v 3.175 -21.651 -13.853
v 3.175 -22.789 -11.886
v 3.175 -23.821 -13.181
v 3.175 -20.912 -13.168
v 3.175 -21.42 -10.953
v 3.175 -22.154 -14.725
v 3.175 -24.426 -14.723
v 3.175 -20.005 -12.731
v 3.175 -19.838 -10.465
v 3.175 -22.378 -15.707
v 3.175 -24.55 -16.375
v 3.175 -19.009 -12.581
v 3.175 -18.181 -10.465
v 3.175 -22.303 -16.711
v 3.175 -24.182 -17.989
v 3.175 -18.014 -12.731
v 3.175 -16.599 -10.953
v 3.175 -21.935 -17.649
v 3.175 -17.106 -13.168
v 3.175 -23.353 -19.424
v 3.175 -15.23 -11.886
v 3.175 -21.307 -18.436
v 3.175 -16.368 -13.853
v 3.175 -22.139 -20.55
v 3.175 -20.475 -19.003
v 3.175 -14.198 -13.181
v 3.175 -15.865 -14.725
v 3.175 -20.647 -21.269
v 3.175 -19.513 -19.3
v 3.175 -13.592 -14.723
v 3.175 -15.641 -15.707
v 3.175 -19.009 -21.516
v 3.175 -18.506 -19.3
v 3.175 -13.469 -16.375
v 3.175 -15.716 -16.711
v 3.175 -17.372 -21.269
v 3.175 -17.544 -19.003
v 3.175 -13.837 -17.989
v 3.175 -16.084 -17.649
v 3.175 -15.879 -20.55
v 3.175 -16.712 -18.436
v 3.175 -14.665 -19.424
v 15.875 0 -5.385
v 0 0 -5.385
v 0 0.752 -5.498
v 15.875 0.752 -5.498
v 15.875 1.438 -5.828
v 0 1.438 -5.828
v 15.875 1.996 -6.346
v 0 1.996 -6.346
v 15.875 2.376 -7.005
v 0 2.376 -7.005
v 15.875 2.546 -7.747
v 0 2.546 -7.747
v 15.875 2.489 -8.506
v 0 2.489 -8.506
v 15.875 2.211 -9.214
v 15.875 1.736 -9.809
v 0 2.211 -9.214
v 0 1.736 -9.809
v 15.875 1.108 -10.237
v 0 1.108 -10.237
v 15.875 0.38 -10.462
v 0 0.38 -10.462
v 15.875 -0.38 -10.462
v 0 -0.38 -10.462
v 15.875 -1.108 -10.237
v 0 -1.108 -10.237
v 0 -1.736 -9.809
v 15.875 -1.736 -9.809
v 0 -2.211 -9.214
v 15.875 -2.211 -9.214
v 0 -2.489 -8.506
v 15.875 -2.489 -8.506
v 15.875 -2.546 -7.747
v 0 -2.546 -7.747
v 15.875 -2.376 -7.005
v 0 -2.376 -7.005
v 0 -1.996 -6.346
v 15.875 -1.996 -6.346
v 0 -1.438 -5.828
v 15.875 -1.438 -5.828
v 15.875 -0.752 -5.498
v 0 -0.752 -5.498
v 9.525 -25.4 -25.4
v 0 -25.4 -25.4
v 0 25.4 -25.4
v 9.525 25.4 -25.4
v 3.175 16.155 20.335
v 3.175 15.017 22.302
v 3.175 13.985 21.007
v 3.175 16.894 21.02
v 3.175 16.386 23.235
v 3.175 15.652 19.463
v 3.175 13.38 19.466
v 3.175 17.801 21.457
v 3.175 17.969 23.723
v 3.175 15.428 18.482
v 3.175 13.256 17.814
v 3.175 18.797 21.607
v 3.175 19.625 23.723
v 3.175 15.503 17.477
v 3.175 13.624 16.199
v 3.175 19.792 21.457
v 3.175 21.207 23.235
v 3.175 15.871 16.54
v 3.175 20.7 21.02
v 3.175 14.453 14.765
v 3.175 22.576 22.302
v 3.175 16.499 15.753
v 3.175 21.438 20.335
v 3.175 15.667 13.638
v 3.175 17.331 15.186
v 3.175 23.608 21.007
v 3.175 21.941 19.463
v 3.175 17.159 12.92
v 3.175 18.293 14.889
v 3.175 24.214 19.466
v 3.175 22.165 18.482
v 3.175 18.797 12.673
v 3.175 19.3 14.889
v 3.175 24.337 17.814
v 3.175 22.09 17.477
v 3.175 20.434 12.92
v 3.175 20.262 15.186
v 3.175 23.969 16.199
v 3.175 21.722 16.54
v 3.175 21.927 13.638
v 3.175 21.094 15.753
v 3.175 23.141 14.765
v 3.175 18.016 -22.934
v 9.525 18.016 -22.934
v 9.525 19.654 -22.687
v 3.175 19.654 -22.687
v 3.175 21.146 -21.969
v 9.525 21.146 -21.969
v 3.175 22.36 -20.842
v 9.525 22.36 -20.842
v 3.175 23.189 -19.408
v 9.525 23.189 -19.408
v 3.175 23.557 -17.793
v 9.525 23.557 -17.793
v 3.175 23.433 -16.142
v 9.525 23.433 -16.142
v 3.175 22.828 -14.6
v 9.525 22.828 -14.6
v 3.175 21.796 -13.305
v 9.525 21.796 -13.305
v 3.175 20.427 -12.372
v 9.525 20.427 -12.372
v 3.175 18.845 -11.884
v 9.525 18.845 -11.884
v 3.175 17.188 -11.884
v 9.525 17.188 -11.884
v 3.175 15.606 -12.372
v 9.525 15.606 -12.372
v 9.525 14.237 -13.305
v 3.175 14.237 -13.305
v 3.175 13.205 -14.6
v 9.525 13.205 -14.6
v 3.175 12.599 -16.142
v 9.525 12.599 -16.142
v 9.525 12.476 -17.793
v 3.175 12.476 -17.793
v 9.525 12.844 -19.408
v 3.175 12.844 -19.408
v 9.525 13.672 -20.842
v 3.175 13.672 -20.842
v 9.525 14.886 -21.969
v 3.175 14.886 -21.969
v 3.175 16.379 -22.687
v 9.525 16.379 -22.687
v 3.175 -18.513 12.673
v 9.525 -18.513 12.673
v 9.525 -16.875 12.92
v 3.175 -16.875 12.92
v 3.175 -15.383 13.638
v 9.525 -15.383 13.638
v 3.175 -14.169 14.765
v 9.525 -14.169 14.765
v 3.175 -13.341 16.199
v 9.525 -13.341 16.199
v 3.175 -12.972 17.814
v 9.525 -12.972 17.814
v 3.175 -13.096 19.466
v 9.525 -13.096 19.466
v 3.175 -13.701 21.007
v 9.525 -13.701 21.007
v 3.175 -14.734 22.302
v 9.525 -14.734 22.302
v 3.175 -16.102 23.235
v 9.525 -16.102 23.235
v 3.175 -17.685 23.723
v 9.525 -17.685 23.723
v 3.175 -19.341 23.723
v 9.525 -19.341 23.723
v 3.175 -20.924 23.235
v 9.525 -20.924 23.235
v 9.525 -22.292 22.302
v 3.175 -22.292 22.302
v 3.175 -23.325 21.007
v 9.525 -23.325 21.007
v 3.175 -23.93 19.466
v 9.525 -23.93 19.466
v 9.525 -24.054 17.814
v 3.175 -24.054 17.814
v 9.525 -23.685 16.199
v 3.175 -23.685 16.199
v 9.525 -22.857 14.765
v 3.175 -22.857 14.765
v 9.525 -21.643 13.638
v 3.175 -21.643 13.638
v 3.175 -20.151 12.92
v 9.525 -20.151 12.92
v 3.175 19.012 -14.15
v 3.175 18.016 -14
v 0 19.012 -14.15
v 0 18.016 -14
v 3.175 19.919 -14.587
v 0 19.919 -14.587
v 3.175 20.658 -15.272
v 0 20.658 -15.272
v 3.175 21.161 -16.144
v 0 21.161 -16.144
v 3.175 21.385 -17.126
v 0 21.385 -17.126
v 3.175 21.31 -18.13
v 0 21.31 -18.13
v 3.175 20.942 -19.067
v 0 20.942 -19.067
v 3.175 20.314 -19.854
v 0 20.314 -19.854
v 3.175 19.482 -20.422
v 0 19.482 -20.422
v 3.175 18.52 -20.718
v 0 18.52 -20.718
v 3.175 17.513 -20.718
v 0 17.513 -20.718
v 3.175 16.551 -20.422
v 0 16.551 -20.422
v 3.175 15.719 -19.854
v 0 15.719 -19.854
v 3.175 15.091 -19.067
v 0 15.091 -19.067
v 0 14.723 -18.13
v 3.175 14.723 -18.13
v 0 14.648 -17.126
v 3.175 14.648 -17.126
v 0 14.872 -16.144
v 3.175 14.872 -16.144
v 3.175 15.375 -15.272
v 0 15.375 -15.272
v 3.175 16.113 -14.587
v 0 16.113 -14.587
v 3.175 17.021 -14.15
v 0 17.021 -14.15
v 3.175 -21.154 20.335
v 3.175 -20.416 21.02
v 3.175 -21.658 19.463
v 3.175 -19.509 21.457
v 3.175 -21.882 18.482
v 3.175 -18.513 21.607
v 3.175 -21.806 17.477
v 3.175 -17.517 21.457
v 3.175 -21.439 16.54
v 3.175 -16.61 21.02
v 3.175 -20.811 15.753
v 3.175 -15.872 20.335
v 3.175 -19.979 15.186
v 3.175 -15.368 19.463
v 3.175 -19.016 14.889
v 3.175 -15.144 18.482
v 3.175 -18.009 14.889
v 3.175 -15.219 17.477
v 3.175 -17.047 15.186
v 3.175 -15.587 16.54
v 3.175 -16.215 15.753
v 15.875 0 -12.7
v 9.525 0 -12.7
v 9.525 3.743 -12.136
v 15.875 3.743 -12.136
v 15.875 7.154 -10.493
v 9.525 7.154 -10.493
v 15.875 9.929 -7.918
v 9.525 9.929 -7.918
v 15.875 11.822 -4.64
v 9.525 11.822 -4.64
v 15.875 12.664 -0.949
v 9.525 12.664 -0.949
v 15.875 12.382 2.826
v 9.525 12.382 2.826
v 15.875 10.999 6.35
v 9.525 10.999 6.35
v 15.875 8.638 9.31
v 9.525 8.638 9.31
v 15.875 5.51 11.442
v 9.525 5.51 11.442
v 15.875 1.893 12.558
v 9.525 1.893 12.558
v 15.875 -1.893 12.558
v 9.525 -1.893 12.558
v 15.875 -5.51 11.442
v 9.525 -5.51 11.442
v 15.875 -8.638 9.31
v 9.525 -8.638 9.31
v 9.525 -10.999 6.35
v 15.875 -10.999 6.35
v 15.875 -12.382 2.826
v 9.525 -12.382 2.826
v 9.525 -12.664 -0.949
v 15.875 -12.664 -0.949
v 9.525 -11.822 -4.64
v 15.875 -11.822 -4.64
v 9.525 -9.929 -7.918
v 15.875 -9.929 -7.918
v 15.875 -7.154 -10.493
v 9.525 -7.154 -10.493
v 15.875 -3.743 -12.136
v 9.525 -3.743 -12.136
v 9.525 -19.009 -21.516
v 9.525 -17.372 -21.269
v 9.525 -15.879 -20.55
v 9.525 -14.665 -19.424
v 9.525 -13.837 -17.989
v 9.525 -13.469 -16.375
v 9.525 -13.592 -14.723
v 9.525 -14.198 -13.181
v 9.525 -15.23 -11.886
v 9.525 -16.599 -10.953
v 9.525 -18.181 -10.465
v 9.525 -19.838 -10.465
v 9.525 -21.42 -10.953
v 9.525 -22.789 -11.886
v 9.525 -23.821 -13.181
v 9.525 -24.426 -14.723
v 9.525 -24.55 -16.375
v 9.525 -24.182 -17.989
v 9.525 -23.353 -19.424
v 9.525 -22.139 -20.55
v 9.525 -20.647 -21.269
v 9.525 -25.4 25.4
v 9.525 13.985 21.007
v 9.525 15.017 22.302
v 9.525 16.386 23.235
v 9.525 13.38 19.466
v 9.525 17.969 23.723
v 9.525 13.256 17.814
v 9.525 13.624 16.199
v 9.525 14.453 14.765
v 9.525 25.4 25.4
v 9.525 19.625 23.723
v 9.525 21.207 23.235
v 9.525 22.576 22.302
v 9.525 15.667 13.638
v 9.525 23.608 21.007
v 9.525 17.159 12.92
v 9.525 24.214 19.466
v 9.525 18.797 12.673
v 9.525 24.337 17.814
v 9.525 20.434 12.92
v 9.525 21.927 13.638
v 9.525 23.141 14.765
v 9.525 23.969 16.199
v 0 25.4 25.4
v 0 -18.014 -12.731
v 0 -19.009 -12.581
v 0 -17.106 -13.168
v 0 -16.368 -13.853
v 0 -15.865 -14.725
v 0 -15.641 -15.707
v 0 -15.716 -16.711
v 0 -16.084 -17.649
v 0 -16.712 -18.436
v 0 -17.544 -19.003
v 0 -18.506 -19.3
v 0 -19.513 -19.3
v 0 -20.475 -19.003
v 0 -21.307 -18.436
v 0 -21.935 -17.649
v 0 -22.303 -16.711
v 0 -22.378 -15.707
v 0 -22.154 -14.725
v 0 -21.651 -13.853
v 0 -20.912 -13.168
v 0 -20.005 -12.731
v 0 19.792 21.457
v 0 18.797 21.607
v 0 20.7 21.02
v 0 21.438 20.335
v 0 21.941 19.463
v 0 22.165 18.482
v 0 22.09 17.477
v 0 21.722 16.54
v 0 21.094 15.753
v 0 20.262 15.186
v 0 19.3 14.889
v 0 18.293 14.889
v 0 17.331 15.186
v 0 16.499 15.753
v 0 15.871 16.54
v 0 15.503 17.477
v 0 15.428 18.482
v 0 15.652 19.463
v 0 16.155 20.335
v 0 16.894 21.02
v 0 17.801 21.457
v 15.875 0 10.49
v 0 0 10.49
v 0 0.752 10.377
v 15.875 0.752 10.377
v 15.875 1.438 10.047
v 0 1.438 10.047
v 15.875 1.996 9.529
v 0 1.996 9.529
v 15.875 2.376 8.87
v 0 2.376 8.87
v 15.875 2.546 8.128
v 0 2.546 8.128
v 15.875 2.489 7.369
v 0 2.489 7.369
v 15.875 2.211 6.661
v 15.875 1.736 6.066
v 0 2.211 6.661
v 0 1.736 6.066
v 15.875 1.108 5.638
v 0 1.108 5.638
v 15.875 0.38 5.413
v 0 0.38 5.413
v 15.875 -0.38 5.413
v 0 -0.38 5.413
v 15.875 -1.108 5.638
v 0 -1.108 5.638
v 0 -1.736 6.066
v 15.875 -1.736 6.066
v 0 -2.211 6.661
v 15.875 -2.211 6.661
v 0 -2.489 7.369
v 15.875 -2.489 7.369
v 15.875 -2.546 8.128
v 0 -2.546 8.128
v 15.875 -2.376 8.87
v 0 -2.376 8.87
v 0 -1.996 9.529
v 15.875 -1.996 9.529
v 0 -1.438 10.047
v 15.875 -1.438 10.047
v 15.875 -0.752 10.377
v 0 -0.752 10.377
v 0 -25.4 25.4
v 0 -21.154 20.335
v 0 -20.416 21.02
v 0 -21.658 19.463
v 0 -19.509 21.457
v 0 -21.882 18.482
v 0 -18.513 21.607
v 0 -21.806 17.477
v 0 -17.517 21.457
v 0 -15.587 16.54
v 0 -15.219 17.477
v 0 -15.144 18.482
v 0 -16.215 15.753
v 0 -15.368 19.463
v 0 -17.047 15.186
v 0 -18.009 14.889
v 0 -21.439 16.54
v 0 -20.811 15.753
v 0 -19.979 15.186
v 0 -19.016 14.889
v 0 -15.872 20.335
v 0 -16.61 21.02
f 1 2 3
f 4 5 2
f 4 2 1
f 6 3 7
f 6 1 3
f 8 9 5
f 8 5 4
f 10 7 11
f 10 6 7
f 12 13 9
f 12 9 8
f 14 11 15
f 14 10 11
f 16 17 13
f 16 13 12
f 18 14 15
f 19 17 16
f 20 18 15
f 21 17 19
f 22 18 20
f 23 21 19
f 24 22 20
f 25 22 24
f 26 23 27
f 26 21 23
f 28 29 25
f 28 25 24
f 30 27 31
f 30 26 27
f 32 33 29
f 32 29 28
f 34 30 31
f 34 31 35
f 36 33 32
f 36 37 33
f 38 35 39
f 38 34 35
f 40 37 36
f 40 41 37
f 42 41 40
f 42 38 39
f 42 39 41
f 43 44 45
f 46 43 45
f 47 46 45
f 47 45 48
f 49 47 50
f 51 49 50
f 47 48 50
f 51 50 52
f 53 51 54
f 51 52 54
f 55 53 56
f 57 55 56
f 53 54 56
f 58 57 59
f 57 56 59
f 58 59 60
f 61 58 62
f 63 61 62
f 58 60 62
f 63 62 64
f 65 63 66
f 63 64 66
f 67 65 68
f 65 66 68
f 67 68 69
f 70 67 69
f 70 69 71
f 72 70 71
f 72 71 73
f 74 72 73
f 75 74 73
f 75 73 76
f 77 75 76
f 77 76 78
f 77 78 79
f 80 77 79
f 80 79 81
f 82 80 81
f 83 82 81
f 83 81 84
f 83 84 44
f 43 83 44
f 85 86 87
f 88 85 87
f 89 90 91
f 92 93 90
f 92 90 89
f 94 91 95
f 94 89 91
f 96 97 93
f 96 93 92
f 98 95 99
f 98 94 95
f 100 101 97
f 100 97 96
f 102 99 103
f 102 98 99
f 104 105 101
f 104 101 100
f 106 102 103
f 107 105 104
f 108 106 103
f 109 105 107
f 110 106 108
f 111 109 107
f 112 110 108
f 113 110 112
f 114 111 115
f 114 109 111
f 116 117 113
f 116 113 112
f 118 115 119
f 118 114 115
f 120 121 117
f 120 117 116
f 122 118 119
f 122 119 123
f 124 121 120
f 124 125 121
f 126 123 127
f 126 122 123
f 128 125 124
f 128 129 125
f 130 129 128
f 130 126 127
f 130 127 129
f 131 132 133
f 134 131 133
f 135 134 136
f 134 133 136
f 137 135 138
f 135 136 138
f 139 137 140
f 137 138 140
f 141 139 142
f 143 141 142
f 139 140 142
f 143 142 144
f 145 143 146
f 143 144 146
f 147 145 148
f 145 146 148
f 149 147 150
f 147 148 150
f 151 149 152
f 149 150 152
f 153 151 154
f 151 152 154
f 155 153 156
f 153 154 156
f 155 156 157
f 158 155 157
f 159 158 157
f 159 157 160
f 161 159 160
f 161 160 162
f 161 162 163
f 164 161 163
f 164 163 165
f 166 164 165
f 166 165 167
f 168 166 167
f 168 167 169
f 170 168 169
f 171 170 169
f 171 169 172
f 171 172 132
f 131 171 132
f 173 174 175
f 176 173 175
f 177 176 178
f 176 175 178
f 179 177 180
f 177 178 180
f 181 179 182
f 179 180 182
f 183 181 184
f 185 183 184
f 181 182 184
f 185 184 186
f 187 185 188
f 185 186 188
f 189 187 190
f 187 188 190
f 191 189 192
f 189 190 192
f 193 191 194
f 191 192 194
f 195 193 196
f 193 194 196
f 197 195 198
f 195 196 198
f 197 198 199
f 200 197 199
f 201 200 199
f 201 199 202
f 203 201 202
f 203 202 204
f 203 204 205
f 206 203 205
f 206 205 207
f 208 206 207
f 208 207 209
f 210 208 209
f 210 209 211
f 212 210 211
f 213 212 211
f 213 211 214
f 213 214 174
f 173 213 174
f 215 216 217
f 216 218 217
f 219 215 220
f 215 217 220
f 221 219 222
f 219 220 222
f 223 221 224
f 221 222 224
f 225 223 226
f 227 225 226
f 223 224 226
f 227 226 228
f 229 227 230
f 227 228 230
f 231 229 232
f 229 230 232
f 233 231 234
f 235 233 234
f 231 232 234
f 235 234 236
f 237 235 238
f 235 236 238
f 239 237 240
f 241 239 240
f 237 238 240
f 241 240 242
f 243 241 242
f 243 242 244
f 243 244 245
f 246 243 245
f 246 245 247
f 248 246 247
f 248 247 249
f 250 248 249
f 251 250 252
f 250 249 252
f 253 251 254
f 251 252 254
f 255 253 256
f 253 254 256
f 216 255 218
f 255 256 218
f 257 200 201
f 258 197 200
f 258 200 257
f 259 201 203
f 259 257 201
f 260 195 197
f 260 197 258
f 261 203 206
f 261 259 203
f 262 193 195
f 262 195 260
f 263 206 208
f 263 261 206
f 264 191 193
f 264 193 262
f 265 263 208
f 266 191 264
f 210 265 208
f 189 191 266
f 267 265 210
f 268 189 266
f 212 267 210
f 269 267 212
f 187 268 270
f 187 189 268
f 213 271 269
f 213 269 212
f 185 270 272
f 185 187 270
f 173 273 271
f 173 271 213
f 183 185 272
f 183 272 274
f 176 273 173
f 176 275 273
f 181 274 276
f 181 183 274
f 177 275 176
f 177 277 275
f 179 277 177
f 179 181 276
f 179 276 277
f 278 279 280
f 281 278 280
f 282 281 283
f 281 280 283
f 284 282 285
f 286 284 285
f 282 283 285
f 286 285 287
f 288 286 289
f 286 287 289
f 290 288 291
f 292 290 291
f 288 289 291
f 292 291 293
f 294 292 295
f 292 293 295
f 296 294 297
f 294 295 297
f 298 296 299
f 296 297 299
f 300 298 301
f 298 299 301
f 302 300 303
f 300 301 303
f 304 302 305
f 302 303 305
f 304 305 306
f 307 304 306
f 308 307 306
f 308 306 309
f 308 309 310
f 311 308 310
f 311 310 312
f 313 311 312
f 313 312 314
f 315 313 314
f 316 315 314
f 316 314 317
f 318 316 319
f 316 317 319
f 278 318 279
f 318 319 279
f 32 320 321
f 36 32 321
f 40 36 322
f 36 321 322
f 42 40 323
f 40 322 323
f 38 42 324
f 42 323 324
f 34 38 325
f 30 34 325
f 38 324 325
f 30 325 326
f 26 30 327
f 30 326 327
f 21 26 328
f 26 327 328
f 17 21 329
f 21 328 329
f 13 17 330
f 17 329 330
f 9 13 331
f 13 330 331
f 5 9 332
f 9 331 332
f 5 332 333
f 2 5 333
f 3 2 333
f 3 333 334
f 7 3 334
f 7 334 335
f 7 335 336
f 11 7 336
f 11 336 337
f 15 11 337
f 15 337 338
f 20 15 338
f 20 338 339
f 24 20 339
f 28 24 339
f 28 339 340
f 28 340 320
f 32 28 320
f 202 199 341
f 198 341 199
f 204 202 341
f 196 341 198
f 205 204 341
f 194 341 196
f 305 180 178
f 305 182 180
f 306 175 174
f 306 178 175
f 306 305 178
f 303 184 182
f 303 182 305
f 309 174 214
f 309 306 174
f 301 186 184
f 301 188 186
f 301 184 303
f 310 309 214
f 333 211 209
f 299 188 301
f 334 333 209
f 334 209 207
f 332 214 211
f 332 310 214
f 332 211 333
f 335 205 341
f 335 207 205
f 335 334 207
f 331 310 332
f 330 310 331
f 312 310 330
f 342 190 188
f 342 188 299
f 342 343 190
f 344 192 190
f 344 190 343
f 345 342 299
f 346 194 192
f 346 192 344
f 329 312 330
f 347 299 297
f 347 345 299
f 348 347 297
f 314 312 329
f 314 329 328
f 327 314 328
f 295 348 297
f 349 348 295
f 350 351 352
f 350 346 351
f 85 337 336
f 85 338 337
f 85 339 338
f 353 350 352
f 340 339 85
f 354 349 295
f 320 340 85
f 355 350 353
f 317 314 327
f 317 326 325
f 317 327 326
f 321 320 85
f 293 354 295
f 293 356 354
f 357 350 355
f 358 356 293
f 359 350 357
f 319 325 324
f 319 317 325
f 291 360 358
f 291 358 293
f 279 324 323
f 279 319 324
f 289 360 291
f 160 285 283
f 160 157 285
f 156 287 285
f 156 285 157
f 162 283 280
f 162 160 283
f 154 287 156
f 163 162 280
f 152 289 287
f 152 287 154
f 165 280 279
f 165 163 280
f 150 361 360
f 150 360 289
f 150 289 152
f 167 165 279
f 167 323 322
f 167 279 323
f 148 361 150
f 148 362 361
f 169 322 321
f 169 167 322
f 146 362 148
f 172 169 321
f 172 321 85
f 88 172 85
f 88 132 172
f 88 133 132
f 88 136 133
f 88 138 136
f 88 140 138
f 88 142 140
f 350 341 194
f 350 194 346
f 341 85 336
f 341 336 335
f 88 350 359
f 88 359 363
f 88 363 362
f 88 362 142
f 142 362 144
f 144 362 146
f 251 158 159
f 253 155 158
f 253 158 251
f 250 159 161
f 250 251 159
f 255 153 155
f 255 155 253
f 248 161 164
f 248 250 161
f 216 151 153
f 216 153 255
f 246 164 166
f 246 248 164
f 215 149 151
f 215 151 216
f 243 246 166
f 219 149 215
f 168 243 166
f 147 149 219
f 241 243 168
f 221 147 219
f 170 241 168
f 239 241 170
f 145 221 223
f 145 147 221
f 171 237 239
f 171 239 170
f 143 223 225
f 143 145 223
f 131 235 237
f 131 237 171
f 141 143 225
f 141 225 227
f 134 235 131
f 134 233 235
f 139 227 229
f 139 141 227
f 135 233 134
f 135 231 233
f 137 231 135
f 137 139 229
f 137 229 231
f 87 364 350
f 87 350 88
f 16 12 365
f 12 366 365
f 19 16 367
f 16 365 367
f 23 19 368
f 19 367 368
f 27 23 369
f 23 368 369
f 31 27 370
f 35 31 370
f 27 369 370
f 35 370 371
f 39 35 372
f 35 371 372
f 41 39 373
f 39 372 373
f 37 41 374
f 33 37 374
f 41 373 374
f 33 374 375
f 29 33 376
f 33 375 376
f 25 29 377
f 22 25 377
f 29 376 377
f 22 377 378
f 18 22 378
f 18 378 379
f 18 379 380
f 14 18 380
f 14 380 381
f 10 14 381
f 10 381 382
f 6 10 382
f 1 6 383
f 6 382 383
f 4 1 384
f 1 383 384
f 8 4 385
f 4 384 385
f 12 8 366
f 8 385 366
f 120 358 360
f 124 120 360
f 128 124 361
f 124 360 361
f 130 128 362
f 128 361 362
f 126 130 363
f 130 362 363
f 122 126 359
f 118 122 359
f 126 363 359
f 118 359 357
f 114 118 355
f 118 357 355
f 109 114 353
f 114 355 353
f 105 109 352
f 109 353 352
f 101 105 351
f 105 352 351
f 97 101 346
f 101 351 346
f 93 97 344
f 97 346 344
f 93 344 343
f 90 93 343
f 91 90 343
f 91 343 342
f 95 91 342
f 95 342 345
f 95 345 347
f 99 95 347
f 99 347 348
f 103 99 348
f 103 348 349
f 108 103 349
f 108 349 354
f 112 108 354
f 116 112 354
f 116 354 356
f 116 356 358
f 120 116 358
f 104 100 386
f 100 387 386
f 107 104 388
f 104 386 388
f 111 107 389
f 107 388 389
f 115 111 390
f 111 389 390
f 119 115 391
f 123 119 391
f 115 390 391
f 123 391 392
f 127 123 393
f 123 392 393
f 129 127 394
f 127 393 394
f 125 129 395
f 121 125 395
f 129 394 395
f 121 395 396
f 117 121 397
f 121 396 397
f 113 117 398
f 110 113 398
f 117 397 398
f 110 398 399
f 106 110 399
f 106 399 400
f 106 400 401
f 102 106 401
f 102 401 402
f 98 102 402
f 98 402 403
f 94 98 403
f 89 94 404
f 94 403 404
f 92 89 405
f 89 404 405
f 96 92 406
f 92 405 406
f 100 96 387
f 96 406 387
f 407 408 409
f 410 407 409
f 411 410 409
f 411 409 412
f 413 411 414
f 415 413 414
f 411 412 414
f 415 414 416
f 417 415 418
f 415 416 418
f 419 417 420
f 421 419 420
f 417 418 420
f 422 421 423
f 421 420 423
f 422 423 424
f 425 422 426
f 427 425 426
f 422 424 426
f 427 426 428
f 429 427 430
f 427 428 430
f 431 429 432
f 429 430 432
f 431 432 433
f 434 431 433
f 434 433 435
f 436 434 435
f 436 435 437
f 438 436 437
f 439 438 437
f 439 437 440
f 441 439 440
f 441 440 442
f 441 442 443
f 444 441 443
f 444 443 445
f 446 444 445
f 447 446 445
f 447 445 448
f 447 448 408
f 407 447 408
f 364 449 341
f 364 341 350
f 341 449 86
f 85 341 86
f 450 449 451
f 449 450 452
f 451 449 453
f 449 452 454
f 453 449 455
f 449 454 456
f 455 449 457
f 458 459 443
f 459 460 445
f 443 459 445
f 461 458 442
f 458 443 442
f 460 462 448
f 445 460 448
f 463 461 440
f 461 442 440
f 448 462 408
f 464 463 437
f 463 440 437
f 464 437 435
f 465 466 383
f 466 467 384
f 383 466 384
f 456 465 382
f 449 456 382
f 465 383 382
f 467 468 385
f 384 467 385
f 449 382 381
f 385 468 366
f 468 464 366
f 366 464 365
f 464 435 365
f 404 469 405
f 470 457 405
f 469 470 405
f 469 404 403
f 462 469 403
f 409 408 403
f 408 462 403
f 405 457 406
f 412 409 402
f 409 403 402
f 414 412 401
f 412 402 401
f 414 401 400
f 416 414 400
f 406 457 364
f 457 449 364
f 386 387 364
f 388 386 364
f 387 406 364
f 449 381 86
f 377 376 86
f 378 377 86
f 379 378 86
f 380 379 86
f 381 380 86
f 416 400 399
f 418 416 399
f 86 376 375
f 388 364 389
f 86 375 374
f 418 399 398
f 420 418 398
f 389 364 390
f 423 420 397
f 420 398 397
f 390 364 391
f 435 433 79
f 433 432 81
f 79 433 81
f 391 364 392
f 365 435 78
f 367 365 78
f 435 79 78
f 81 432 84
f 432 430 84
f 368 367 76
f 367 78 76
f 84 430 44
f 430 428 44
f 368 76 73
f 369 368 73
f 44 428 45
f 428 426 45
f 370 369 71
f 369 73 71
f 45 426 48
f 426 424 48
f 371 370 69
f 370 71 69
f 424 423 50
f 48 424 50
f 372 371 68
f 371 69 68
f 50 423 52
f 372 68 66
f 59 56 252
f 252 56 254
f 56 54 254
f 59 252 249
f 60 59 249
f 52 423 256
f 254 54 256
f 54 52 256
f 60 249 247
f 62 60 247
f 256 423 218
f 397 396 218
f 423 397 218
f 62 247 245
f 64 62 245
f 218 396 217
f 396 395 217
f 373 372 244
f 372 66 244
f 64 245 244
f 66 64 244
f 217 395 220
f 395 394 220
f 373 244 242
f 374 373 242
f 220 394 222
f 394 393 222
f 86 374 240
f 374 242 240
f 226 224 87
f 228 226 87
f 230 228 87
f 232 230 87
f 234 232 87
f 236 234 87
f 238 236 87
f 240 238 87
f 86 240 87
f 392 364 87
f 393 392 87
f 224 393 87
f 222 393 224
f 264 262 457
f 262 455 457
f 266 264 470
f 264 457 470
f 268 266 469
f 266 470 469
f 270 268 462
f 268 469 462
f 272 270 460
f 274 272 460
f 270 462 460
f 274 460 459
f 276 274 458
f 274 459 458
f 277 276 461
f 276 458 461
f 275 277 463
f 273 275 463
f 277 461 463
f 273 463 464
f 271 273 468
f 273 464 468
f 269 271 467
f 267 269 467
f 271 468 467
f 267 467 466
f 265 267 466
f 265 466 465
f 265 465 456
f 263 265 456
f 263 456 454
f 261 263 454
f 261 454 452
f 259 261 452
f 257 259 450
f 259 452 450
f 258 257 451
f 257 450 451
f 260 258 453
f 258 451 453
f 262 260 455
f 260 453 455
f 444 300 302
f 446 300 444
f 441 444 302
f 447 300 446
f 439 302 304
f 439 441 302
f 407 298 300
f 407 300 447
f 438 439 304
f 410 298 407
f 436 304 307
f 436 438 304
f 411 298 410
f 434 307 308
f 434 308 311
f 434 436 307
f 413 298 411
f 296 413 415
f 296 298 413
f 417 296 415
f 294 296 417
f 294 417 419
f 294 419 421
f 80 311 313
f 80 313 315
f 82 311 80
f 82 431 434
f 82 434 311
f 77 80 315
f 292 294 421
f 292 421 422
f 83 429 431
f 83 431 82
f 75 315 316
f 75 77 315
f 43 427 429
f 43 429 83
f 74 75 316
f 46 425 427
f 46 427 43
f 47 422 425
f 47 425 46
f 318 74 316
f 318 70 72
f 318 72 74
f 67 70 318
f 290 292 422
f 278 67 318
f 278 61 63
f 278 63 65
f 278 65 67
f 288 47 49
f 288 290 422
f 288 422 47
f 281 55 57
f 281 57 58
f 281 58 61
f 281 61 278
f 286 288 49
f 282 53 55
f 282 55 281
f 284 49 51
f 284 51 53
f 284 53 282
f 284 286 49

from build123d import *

# Parameters (mm, degrees)
SKETCH1_W                                        = 50.8
SKETCH1_H                                        = 50.8
BOSS_EXTRUDE1_DEPTH                              = 9.525
SKETCH2_R                                        = 12.7
BOSS_EXTRUDE2_DEPTH                              = 6.35
F_1_4_20_TAPPED_HOLE1_D                          = 5.1054
CBORE_FOR_1_4_SOCKET_HEAD_CAP_SCREW1_D           = 6.7564
CBORE_FOR_1_4_SOCKET_HEAD_CAP_SCREW1_CBORE_D     = 11.1125
CBORE_FOR_1_4_SOCKET_HEAD_CAP_SCREW1_CBORE_DEPTH = 6.35


with BuildPart() as part:
    # Sketch1 → Boss-Extrude1 (new body)
    with BuildSketch(Plane(origin=(0, 0, 0), x_dir=(0, 0, -1), z_dir=(1, 0, 0))):
        Rectangle(SKETCH1_W, SKETCH1_H)
    extrude(amount=BOSS_EXTRUDE1_DEPTH)

    # Sketch2 → Boss-Extrude2 (add)
    with BuildSketch(Plane(origin=(9.525, 0, 0), x_dir=(0, 0, -1), z_dir=(1, 0, 0))):
        Circle(SKETCH2_R)
    extrude(amount=BOSS_EXTRUDE2_DEPTH)

    # 1/4-20 Tapped Hole1 (through all)
    with Locations(Plane(origin=(15.875, 0, 0), x_dir=(0, 0, -1), z_dir=(1, 0, 0))):
        with Locations((-7.9375, 0), (7.9375, 0)):
            Hole(F_1_4_20_TAPPED_HOLE1_D / 2)

    # CBORE for 1/4 Socket Head Cap Screw1 (through all)
    with Locations(Plane(origin=(9.525, 0, 0), x_dir=(0, 0, -1), z_dir=(1, 0, 0))):
        with Locations((-18.22919312, 18.79663882), (17.378024569, 18.016400982), (15.959410319, -19.009430957), (-18.22919312, -18.51291597)):
            CounterBoreHole(CBORE_FOR_1_4_SOCKET_HEAD_CAP_SCREW1_D / 2, CBORE_FOR_1_4_SOCKET_HEAD_CAP_SCREW1_CBORE_D / 2, CBORE_FOR_1_4_SOCKET_HEAD_CAP_SCREW1_CBORE_DEPTH)


solid = part.part
